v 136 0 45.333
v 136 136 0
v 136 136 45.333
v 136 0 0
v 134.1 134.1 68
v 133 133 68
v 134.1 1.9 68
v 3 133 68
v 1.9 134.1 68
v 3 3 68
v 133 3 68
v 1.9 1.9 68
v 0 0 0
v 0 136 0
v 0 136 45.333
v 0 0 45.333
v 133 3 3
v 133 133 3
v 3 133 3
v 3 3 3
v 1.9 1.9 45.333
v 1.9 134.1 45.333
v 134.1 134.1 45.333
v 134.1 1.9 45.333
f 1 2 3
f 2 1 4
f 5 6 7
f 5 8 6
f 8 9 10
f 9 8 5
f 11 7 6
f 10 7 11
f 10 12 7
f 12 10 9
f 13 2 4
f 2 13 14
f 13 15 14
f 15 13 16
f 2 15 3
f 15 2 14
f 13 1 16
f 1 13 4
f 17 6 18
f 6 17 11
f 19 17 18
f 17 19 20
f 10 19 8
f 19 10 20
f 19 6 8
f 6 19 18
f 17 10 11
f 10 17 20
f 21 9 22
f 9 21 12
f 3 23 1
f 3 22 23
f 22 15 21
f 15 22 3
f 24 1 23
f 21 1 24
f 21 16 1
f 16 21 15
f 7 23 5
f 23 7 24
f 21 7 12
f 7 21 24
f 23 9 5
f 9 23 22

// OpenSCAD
outside = 136;
thickness = 3;
lip_z = outside / 6;
tolerance = .4;

difference() {
    cube([outside, outside, (outside / 2)]);
    translate([thickness, thickness, thickness]) {
        cube(outside - (thickness * 2));
    }
   
    color("blue") {
        translate([0, 0, ((outside / 2) - lip_z)]) {
            cube([((thickness / 2) + tolerance), outside, lip_z]);
        }
    }
    color("green") {
        translate([(outside - ((thickness / 2) + tolerance)), 0, ((outside / 2) - lip_z)]) {
            cube([((thickness / 2) + tolerance), outside, lip_z]);
        }
    }
    color("purple") {
        translate([0, 0, ((outside / 2) - lip_z)]) {
            cube([outside, ((thickness / 2) + tolerance), lip_z]);
        }
    }
    color("red") {
        translate([0, (outside - (thickness / 2) - tolerance), (outside / 2) - lip_z]) {
            cube([outside, ((thickness / 2) + tolerance), lip_z]);
        }
    }
}
